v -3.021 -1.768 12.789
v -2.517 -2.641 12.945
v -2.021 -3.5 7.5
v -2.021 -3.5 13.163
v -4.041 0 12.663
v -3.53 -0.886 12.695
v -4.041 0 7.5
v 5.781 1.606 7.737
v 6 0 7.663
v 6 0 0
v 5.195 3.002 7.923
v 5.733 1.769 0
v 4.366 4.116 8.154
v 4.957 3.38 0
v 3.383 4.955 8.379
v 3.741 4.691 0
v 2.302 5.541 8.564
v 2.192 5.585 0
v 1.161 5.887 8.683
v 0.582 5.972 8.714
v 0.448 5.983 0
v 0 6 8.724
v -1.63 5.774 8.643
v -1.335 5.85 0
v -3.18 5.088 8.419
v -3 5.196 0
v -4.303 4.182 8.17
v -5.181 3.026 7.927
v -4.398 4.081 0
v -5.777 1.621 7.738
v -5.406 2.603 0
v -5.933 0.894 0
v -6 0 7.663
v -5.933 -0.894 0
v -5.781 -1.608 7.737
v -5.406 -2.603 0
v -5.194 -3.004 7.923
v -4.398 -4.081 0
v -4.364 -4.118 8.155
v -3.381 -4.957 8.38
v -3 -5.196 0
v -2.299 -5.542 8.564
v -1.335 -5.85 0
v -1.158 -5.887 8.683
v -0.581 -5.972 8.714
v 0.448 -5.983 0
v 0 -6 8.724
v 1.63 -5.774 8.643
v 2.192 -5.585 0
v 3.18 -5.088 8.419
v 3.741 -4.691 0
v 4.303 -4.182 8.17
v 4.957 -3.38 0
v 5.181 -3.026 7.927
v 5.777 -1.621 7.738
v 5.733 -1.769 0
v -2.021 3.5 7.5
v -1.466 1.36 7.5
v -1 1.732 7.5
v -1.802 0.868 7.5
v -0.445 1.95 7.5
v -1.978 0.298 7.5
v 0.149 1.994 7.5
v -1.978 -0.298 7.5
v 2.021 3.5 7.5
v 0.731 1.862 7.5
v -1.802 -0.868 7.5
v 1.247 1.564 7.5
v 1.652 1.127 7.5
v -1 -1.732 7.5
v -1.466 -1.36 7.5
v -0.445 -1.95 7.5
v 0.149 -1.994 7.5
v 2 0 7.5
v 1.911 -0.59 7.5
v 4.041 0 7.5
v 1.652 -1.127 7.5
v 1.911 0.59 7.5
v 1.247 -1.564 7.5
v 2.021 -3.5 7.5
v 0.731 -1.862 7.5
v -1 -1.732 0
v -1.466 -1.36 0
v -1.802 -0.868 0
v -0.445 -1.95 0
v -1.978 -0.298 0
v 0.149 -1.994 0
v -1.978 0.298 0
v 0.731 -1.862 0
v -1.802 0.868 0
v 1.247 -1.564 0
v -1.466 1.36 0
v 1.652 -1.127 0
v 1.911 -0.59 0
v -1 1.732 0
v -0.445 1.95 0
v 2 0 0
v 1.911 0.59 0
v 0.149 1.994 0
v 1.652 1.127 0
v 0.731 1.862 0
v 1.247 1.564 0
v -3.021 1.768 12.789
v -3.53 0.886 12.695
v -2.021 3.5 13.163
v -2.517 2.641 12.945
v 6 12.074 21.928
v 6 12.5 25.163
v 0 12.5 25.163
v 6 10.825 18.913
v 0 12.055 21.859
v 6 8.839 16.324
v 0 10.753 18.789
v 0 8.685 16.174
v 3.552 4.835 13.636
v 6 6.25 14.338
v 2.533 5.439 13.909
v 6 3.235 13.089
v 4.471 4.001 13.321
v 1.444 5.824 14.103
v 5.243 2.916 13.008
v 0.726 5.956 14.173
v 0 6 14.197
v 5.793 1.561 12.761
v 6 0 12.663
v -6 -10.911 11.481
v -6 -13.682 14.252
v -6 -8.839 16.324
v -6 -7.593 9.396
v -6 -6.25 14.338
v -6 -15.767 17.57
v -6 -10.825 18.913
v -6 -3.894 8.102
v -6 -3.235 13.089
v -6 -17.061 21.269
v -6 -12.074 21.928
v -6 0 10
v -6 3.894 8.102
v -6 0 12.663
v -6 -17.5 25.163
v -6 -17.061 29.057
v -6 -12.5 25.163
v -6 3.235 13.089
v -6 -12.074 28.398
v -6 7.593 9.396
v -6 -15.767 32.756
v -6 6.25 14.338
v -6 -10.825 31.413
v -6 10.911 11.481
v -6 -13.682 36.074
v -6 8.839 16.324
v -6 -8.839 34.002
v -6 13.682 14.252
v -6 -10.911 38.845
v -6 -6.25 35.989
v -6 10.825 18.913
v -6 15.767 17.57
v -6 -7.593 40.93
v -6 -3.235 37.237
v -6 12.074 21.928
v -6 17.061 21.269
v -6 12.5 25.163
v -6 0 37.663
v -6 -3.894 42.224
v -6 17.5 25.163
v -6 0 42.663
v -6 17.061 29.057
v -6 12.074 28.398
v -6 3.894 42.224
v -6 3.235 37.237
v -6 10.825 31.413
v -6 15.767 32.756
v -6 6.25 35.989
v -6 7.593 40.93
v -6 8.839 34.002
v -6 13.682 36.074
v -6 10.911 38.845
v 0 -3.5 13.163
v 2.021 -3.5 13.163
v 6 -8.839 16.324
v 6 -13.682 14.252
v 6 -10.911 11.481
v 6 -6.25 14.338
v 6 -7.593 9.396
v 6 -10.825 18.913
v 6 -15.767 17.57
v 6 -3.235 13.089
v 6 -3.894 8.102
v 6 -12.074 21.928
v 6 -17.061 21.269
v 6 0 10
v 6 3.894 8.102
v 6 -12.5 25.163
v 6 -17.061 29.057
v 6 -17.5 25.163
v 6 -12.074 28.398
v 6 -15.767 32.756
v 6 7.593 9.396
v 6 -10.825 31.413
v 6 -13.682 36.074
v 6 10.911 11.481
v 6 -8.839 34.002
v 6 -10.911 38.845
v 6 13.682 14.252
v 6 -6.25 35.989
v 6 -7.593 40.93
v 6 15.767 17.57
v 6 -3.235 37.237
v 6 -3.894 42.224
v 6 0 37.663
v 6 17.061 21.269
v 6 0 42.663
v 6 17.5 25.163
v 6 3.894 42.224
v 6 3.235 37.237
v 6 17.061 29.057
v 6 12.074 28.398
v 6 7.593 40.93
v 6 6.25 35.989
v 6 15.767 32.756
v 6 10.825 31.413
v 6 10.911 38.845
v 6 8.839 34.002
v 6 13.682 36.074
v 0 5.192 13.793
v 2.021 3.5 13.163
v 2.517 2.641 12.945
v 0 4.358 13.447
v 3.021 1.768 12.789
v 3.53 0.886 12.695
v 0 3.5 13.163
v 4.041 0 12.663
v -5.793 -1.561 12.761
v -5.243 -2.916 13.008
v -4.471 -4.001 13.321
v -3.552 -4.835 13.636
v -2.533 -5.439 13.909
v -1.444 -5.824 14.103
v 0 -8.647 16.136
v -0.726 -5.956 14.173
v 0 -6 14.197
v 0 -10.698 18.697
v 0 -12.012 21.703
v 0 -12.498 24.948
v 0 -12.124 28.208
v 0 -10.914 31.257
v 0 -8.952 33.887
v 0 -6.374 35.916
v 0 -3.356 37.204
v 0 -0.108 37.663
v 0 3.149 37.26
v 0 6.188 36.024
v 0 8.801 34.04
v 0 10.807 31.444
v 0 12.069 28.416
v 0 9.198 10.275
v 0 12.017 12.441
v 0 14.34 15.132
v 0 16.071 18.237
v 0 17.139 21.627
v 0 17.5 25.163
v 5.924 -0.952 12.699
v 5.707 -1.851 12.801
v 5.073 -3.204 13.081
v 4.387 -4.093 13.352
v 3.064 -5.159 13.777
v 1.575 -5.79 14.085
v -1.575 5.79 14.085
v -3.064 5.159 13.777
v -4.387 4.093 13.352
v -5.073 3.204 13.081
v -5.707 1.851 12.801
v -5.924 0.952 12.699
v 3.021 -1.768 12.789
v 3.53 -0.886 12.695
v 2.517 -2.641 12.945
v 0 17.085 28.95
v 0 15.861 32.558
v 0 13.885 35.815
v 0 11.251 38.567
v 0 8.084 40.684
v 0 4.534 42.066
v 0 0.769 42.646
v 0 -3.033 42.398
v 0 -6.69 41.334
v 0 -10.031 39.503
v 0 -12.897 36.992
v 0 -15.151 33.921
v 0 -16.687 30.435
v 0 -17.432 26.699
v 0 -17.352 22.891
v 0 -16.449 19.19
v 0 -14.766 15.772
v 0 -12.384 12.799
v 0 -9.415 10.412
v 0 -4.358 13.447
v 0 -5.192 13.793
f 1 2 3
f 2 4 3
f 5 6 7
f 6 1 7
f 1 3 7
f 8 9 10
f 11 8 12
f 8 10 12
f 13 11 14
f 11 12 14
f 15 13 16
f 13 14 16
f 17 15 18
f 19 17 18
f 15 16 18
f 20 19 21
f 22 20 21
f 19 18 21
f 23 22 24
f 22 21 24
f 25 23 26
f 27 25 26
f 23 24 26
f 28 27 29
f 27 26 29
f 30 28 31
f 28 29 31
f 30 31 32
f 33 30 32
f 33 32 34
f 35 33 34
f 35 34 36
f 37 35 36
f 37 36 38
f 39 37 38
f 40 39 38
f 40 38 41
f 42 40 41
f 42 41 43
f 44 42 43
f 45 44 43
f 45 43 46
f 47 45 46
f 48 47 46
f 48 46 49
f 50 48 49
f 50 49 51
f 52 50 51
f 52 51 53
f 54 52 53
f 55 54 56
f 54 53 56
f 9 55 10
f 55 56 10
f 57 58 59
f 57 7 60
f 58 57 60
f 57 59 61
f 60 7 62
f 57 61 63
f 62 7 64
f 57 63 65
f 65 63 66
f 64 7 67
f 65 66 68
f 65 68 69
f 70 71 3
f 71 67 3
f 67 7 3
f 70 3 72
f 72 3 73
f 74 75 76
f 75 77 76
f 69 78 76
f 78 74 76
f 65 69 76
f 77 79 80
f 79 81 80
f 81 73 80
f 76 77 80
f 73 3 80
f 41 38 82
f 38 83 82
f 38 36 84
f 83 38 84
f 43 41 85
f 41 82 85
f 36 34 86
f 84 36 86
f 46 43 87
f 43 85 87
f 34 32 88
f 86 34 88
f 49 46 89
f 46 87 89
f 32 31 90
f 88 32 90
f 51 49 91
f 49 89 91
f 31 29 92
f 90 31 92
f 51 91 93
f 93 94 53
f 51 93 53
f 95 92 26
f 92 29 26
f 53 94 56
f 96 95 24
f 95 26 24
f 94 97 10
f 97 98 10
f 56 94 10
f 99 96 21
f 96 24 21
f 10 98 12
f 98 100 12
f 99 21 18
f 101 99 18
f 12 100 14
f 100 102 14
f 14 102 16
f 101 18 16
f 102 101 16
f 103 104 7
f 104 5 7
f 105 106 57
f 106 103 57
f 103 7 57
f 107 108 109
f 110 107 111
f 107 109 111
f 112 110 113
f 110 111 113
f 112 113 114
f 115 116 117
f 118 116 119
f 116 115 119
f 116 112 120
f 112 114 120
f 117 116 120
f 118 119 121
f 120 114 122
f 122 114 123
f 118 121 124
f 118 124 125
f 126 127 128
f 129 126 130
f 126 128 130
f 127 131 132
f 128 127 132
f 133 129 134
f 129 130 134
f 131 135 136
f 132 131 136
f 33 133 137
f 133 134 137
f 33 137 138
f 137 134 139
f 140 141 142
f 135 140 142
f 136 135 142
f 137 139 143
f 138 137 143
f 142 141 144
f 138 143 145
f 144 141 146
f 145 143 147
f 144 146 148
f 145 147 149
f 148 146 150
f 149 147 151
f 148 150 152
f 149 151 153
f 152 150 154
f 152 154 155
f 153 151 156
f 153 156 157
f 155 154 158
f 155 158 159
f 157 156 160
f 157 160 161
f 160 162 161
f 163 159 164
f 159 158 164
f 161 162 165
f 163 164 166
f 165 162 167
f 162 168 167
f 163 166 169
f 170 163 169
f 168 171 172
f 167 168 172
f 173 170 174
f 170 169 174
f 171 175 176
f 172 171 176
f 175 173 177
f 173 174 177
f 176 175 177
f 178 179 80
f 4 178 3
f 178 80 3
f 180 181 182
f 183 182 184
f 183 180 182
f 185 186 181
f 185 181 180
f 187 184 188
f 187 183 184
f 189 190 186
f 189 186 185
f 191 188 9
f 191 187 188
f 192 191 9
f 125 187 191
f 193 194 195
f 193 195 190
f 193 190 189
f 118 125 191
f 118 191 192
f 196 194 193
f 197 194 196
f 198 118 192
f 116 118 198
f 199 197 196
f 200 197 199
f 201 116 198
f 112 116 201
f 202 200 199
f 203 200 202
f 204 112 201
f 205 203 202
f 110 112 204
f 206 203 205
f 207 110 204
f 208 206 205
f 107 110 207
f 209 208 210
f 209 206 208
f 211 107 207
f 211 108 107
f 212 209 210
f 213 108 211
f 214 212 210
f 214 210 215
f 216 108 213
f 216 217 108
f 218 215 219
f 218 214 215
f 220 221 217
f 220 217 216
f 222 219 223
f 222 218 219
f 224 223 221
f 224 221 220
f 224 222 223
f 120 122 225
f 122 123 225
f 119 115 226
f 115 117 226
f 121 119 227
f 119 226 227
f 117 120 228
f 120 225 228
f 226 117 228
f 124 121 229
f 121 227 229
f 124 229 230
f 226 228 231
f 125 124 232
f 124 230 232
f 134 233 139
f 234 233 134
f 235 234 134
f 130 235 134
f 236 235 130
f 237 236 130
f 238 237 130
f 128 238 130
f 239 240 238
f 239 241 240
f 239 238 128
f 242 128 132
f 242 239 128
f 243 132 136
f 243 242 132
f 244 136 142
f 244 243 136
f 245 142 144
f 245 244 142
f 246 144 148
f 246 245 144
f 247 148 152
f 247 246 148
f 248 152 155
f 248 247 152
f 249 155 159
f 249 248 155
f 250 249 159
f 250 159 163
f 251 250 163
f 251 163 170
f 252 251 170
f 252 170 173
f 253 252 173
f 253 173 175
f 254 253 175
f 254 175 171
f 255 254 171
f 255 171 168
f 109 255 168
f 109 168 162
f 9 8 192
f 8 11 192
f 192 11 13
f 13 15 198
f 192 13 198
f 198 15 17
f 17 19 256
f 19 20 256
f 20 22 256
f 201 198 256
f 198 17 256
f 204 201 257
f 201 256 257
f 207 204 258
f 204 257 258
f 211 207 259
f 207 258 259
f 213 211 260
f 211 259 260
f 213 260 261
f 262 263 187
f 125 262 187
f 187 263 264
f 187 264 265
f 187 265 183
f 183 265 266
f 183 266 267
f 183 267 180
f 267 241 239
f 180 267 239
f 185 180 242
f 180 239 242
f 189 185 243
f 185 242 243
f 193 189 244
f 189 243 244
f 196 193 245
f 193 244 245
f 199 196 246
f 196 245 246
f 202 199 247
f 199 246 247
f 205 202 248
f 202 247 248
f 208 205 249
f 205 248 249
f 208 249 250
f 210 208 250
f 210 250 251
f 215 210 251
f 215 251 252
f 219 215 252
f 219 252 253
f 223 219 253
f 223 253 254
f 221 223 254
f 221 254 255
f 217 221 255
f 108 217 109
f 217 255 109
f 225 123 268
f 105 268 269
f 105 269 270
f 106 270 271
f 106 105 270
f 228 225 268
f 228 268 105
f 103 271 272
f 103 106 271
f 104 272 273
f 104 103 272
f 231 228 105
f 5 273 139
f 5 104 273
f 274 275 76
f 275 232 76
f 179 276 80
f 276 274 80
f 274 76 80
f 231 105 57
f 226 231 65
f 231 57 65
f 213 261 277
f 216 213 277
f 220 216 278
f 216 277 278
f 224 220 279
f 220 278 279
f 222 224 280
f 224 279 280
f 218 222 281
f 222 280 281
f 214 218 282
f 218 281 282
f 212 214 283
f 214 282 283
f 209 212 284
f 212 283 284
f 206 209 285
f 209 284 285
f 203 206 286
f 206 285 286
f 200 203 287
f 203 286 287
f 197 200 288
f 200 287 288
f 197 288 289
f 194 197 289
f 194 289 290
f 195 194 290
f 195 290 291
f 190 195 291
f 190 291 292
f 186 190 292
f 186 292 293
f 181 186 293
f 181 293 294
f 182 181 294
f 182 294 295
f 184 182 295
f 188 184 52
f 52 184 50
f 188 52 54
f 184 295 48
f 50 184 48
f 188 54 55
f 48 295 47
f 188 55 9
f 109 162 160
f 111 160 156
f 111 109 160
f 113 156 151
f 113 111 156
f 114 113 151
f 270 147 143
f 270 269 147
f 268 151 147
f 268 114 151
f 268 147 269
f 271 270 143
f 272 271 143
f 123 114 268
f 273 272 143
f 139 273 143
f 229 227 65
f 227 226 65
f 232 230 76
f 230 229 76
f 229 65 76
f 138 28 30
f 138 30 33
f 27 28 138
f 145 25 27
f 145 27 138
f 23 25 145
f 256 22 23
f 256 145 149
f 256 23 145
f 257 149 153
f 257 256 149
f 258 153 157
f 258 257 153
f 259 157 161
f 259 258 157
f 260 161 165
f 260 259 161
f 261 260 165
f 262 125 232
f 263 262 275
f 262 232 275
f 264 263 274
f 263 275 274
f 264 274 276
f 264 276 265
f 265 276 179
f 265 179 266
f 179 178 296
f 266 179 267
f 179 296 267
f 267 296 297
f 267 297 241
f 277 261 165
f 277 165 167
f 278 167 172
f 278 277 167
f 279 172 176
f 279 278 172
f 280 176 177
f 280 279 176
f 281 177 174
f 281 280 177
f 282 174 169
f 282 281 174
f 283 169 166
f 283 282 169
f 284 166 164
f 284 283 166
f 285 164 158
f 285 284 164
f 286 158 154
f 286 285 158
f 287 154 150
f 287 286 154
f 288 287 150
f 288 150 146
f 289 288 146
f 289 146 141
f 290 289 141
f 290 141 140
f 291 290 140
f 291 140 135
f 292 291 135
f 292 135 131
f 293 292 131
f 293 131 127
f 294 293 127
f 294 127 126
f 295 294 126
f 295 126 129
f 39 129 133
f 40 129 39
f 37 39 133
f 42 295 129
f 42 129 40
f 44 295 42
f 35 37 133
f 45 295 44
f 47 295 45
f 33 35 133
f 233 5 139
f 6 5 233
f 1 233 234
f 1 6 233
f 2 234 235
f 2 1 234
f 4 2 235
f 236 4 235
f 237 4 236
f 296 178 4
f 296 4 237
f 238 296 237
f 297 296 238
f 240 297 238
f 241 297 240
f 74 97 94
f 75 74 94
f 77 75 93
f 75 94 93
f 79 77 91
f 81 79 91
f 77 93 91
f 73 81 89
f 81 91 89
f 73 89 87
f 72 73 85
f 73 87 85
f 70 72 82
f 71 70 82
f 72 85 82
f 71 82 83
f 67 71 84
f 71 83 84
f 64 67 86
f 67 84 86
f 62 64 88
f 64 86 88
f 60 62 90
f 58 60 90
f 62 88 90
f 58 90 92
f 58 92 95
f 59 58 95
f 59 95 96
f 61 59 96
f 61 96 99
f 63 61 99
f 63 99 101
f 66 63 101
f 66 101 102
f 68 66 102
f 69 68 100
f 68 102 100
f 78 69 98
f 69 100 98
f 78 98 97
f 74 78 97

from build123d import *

# Parameters (mm, degrees)
F0_R          = 6
F0_R_2        = 2
F1_DEPTH      = 5
F2_R          = 6
F3_DEPTH      = 5
F4_R          = 17.5
F5_DEPTH      = 6
F5_DEPTH_BACK = 6
F7_END_RADIUS = 12.5
F6_R          = 6
F7_REACH      = 59.6347554857
F9_DEPTH      = 25
F10_R         = 6
F10_R_2       = 2
F11_DEPTH     = 7.5


with BuildPart() as f1:
    # F0 (on Top) → F1 (new body)
    with BuildSketch(Plane.XY):
        Circle(F0_R)
        Polygon((-4.0414518843, 0), (-2.0207259422, 3.5), (2.0207259422, 3.5), (4.0414518843, 0), (2.0207259422, -3.5), (-2.0207259422, -3.5), align=None, mode=Mode.SUBTRACT)
        Polygon((2.0207259422, 3.5), (-2.0207259422, 3.5), (-4.0414518843, 0), (-2.0207259422, -3.5), (2.0207259422, -3.5), (4.0414518843, 0), align=None)
        Circle(F0_R_2, mode=Mode.SUBTRACT)
    extrude(amount=F1_DEPTH)

    # F2 (on face) → F3 (join)
    with BuildSketch(Plane.XY.offset(5)):
        Circle(F2_R)
        Polygon((-2.5149954402, 3.1635630654), (1.482228261, 3.7598314744), (3.9972237013, 0.5962684089), (2.5149954402, -3.1635630654), (-1.482228261, -3.7598314744), (-3.9972237013, -0.5962684089), align=None, mode=Mode.SUBTRACT)
    extrude(amount=F3_DEPTH)

    # F4 (on Right) → F5 (join, two sides)
    with BuildSketch(Plane.YZ) as f5_sk:
        with Locations((0, 25.1631926373)):
            Circle(F4_R)
        with BuildLine():
            ThreePointArc((0, 12.6631926373), (-8.8388347648, 34.0020274021), (12.5, 25.1631926373))
            ThreePointArc((12.5, 25.1631926373), (8.8388347648, 16.3243578724), (0, 12.6631926373))
        make_face(mode=Mode.SUBTRACT)
    extrude(amount=-F5_DEPTH)
    extrude(f5_sk.sketch, amount=F5_DEPTH_BACK)

    f7_end = (Plane(origin=(3, 0, 25.1631926373), x_dir=(0, 0, -1), z_dir=(-1, 0, 0)) * Cylinder(F7_END_RADIUS, 232.2145957139, mode=Mode.PRIVATE)).faces().sort_by_distance((3, -12.5, 25.1631926373))[0]
    # F6 (on Top) → F7 (join, up to the whole of a round face its end follows)
    with BuildSketch(Plane.XY):
        Circle(F6_R)
    f7_long = extrude(amount=F7_REACH, mode=Mode.PRIVATE)
    add(split(f7_long, bisect_by=f7_end, keep=Keep.ALL, mode=Mode.PRIVATE).solids().sort_by_distance((0, 0, 0))[0])

    # F8 (on face) → F9 (cut)
    with BuildSketch(Plane(origin=(0, 0, 0), x_dir=(1, 0, 0), z_dir=(0, 0, -1))):
        Polygon((2.0207259422, 3.5), (-2.0207259422, 3.5), (-4.0414518843, 0), (-2.0207259422, -3.5), (2.0207259422, -3.5), (4.0414518843, 0), align=None)
    extrude(amount=-F9_DEPTH, mode=Mode.SUBTRACT)

    # F10 (on face) → F11 (join)
    with BuildSketch(Plane(origin=(0, 0, 0), x_dir=(1, 0, 0), z_dir=(0, 0, -1))):
        Circle(F10_R)
        Circle(F10_R_2, mode=Mode.SUBTRACT)
    extrude(amount=-F11_DEPTH)


solid = f1.part
